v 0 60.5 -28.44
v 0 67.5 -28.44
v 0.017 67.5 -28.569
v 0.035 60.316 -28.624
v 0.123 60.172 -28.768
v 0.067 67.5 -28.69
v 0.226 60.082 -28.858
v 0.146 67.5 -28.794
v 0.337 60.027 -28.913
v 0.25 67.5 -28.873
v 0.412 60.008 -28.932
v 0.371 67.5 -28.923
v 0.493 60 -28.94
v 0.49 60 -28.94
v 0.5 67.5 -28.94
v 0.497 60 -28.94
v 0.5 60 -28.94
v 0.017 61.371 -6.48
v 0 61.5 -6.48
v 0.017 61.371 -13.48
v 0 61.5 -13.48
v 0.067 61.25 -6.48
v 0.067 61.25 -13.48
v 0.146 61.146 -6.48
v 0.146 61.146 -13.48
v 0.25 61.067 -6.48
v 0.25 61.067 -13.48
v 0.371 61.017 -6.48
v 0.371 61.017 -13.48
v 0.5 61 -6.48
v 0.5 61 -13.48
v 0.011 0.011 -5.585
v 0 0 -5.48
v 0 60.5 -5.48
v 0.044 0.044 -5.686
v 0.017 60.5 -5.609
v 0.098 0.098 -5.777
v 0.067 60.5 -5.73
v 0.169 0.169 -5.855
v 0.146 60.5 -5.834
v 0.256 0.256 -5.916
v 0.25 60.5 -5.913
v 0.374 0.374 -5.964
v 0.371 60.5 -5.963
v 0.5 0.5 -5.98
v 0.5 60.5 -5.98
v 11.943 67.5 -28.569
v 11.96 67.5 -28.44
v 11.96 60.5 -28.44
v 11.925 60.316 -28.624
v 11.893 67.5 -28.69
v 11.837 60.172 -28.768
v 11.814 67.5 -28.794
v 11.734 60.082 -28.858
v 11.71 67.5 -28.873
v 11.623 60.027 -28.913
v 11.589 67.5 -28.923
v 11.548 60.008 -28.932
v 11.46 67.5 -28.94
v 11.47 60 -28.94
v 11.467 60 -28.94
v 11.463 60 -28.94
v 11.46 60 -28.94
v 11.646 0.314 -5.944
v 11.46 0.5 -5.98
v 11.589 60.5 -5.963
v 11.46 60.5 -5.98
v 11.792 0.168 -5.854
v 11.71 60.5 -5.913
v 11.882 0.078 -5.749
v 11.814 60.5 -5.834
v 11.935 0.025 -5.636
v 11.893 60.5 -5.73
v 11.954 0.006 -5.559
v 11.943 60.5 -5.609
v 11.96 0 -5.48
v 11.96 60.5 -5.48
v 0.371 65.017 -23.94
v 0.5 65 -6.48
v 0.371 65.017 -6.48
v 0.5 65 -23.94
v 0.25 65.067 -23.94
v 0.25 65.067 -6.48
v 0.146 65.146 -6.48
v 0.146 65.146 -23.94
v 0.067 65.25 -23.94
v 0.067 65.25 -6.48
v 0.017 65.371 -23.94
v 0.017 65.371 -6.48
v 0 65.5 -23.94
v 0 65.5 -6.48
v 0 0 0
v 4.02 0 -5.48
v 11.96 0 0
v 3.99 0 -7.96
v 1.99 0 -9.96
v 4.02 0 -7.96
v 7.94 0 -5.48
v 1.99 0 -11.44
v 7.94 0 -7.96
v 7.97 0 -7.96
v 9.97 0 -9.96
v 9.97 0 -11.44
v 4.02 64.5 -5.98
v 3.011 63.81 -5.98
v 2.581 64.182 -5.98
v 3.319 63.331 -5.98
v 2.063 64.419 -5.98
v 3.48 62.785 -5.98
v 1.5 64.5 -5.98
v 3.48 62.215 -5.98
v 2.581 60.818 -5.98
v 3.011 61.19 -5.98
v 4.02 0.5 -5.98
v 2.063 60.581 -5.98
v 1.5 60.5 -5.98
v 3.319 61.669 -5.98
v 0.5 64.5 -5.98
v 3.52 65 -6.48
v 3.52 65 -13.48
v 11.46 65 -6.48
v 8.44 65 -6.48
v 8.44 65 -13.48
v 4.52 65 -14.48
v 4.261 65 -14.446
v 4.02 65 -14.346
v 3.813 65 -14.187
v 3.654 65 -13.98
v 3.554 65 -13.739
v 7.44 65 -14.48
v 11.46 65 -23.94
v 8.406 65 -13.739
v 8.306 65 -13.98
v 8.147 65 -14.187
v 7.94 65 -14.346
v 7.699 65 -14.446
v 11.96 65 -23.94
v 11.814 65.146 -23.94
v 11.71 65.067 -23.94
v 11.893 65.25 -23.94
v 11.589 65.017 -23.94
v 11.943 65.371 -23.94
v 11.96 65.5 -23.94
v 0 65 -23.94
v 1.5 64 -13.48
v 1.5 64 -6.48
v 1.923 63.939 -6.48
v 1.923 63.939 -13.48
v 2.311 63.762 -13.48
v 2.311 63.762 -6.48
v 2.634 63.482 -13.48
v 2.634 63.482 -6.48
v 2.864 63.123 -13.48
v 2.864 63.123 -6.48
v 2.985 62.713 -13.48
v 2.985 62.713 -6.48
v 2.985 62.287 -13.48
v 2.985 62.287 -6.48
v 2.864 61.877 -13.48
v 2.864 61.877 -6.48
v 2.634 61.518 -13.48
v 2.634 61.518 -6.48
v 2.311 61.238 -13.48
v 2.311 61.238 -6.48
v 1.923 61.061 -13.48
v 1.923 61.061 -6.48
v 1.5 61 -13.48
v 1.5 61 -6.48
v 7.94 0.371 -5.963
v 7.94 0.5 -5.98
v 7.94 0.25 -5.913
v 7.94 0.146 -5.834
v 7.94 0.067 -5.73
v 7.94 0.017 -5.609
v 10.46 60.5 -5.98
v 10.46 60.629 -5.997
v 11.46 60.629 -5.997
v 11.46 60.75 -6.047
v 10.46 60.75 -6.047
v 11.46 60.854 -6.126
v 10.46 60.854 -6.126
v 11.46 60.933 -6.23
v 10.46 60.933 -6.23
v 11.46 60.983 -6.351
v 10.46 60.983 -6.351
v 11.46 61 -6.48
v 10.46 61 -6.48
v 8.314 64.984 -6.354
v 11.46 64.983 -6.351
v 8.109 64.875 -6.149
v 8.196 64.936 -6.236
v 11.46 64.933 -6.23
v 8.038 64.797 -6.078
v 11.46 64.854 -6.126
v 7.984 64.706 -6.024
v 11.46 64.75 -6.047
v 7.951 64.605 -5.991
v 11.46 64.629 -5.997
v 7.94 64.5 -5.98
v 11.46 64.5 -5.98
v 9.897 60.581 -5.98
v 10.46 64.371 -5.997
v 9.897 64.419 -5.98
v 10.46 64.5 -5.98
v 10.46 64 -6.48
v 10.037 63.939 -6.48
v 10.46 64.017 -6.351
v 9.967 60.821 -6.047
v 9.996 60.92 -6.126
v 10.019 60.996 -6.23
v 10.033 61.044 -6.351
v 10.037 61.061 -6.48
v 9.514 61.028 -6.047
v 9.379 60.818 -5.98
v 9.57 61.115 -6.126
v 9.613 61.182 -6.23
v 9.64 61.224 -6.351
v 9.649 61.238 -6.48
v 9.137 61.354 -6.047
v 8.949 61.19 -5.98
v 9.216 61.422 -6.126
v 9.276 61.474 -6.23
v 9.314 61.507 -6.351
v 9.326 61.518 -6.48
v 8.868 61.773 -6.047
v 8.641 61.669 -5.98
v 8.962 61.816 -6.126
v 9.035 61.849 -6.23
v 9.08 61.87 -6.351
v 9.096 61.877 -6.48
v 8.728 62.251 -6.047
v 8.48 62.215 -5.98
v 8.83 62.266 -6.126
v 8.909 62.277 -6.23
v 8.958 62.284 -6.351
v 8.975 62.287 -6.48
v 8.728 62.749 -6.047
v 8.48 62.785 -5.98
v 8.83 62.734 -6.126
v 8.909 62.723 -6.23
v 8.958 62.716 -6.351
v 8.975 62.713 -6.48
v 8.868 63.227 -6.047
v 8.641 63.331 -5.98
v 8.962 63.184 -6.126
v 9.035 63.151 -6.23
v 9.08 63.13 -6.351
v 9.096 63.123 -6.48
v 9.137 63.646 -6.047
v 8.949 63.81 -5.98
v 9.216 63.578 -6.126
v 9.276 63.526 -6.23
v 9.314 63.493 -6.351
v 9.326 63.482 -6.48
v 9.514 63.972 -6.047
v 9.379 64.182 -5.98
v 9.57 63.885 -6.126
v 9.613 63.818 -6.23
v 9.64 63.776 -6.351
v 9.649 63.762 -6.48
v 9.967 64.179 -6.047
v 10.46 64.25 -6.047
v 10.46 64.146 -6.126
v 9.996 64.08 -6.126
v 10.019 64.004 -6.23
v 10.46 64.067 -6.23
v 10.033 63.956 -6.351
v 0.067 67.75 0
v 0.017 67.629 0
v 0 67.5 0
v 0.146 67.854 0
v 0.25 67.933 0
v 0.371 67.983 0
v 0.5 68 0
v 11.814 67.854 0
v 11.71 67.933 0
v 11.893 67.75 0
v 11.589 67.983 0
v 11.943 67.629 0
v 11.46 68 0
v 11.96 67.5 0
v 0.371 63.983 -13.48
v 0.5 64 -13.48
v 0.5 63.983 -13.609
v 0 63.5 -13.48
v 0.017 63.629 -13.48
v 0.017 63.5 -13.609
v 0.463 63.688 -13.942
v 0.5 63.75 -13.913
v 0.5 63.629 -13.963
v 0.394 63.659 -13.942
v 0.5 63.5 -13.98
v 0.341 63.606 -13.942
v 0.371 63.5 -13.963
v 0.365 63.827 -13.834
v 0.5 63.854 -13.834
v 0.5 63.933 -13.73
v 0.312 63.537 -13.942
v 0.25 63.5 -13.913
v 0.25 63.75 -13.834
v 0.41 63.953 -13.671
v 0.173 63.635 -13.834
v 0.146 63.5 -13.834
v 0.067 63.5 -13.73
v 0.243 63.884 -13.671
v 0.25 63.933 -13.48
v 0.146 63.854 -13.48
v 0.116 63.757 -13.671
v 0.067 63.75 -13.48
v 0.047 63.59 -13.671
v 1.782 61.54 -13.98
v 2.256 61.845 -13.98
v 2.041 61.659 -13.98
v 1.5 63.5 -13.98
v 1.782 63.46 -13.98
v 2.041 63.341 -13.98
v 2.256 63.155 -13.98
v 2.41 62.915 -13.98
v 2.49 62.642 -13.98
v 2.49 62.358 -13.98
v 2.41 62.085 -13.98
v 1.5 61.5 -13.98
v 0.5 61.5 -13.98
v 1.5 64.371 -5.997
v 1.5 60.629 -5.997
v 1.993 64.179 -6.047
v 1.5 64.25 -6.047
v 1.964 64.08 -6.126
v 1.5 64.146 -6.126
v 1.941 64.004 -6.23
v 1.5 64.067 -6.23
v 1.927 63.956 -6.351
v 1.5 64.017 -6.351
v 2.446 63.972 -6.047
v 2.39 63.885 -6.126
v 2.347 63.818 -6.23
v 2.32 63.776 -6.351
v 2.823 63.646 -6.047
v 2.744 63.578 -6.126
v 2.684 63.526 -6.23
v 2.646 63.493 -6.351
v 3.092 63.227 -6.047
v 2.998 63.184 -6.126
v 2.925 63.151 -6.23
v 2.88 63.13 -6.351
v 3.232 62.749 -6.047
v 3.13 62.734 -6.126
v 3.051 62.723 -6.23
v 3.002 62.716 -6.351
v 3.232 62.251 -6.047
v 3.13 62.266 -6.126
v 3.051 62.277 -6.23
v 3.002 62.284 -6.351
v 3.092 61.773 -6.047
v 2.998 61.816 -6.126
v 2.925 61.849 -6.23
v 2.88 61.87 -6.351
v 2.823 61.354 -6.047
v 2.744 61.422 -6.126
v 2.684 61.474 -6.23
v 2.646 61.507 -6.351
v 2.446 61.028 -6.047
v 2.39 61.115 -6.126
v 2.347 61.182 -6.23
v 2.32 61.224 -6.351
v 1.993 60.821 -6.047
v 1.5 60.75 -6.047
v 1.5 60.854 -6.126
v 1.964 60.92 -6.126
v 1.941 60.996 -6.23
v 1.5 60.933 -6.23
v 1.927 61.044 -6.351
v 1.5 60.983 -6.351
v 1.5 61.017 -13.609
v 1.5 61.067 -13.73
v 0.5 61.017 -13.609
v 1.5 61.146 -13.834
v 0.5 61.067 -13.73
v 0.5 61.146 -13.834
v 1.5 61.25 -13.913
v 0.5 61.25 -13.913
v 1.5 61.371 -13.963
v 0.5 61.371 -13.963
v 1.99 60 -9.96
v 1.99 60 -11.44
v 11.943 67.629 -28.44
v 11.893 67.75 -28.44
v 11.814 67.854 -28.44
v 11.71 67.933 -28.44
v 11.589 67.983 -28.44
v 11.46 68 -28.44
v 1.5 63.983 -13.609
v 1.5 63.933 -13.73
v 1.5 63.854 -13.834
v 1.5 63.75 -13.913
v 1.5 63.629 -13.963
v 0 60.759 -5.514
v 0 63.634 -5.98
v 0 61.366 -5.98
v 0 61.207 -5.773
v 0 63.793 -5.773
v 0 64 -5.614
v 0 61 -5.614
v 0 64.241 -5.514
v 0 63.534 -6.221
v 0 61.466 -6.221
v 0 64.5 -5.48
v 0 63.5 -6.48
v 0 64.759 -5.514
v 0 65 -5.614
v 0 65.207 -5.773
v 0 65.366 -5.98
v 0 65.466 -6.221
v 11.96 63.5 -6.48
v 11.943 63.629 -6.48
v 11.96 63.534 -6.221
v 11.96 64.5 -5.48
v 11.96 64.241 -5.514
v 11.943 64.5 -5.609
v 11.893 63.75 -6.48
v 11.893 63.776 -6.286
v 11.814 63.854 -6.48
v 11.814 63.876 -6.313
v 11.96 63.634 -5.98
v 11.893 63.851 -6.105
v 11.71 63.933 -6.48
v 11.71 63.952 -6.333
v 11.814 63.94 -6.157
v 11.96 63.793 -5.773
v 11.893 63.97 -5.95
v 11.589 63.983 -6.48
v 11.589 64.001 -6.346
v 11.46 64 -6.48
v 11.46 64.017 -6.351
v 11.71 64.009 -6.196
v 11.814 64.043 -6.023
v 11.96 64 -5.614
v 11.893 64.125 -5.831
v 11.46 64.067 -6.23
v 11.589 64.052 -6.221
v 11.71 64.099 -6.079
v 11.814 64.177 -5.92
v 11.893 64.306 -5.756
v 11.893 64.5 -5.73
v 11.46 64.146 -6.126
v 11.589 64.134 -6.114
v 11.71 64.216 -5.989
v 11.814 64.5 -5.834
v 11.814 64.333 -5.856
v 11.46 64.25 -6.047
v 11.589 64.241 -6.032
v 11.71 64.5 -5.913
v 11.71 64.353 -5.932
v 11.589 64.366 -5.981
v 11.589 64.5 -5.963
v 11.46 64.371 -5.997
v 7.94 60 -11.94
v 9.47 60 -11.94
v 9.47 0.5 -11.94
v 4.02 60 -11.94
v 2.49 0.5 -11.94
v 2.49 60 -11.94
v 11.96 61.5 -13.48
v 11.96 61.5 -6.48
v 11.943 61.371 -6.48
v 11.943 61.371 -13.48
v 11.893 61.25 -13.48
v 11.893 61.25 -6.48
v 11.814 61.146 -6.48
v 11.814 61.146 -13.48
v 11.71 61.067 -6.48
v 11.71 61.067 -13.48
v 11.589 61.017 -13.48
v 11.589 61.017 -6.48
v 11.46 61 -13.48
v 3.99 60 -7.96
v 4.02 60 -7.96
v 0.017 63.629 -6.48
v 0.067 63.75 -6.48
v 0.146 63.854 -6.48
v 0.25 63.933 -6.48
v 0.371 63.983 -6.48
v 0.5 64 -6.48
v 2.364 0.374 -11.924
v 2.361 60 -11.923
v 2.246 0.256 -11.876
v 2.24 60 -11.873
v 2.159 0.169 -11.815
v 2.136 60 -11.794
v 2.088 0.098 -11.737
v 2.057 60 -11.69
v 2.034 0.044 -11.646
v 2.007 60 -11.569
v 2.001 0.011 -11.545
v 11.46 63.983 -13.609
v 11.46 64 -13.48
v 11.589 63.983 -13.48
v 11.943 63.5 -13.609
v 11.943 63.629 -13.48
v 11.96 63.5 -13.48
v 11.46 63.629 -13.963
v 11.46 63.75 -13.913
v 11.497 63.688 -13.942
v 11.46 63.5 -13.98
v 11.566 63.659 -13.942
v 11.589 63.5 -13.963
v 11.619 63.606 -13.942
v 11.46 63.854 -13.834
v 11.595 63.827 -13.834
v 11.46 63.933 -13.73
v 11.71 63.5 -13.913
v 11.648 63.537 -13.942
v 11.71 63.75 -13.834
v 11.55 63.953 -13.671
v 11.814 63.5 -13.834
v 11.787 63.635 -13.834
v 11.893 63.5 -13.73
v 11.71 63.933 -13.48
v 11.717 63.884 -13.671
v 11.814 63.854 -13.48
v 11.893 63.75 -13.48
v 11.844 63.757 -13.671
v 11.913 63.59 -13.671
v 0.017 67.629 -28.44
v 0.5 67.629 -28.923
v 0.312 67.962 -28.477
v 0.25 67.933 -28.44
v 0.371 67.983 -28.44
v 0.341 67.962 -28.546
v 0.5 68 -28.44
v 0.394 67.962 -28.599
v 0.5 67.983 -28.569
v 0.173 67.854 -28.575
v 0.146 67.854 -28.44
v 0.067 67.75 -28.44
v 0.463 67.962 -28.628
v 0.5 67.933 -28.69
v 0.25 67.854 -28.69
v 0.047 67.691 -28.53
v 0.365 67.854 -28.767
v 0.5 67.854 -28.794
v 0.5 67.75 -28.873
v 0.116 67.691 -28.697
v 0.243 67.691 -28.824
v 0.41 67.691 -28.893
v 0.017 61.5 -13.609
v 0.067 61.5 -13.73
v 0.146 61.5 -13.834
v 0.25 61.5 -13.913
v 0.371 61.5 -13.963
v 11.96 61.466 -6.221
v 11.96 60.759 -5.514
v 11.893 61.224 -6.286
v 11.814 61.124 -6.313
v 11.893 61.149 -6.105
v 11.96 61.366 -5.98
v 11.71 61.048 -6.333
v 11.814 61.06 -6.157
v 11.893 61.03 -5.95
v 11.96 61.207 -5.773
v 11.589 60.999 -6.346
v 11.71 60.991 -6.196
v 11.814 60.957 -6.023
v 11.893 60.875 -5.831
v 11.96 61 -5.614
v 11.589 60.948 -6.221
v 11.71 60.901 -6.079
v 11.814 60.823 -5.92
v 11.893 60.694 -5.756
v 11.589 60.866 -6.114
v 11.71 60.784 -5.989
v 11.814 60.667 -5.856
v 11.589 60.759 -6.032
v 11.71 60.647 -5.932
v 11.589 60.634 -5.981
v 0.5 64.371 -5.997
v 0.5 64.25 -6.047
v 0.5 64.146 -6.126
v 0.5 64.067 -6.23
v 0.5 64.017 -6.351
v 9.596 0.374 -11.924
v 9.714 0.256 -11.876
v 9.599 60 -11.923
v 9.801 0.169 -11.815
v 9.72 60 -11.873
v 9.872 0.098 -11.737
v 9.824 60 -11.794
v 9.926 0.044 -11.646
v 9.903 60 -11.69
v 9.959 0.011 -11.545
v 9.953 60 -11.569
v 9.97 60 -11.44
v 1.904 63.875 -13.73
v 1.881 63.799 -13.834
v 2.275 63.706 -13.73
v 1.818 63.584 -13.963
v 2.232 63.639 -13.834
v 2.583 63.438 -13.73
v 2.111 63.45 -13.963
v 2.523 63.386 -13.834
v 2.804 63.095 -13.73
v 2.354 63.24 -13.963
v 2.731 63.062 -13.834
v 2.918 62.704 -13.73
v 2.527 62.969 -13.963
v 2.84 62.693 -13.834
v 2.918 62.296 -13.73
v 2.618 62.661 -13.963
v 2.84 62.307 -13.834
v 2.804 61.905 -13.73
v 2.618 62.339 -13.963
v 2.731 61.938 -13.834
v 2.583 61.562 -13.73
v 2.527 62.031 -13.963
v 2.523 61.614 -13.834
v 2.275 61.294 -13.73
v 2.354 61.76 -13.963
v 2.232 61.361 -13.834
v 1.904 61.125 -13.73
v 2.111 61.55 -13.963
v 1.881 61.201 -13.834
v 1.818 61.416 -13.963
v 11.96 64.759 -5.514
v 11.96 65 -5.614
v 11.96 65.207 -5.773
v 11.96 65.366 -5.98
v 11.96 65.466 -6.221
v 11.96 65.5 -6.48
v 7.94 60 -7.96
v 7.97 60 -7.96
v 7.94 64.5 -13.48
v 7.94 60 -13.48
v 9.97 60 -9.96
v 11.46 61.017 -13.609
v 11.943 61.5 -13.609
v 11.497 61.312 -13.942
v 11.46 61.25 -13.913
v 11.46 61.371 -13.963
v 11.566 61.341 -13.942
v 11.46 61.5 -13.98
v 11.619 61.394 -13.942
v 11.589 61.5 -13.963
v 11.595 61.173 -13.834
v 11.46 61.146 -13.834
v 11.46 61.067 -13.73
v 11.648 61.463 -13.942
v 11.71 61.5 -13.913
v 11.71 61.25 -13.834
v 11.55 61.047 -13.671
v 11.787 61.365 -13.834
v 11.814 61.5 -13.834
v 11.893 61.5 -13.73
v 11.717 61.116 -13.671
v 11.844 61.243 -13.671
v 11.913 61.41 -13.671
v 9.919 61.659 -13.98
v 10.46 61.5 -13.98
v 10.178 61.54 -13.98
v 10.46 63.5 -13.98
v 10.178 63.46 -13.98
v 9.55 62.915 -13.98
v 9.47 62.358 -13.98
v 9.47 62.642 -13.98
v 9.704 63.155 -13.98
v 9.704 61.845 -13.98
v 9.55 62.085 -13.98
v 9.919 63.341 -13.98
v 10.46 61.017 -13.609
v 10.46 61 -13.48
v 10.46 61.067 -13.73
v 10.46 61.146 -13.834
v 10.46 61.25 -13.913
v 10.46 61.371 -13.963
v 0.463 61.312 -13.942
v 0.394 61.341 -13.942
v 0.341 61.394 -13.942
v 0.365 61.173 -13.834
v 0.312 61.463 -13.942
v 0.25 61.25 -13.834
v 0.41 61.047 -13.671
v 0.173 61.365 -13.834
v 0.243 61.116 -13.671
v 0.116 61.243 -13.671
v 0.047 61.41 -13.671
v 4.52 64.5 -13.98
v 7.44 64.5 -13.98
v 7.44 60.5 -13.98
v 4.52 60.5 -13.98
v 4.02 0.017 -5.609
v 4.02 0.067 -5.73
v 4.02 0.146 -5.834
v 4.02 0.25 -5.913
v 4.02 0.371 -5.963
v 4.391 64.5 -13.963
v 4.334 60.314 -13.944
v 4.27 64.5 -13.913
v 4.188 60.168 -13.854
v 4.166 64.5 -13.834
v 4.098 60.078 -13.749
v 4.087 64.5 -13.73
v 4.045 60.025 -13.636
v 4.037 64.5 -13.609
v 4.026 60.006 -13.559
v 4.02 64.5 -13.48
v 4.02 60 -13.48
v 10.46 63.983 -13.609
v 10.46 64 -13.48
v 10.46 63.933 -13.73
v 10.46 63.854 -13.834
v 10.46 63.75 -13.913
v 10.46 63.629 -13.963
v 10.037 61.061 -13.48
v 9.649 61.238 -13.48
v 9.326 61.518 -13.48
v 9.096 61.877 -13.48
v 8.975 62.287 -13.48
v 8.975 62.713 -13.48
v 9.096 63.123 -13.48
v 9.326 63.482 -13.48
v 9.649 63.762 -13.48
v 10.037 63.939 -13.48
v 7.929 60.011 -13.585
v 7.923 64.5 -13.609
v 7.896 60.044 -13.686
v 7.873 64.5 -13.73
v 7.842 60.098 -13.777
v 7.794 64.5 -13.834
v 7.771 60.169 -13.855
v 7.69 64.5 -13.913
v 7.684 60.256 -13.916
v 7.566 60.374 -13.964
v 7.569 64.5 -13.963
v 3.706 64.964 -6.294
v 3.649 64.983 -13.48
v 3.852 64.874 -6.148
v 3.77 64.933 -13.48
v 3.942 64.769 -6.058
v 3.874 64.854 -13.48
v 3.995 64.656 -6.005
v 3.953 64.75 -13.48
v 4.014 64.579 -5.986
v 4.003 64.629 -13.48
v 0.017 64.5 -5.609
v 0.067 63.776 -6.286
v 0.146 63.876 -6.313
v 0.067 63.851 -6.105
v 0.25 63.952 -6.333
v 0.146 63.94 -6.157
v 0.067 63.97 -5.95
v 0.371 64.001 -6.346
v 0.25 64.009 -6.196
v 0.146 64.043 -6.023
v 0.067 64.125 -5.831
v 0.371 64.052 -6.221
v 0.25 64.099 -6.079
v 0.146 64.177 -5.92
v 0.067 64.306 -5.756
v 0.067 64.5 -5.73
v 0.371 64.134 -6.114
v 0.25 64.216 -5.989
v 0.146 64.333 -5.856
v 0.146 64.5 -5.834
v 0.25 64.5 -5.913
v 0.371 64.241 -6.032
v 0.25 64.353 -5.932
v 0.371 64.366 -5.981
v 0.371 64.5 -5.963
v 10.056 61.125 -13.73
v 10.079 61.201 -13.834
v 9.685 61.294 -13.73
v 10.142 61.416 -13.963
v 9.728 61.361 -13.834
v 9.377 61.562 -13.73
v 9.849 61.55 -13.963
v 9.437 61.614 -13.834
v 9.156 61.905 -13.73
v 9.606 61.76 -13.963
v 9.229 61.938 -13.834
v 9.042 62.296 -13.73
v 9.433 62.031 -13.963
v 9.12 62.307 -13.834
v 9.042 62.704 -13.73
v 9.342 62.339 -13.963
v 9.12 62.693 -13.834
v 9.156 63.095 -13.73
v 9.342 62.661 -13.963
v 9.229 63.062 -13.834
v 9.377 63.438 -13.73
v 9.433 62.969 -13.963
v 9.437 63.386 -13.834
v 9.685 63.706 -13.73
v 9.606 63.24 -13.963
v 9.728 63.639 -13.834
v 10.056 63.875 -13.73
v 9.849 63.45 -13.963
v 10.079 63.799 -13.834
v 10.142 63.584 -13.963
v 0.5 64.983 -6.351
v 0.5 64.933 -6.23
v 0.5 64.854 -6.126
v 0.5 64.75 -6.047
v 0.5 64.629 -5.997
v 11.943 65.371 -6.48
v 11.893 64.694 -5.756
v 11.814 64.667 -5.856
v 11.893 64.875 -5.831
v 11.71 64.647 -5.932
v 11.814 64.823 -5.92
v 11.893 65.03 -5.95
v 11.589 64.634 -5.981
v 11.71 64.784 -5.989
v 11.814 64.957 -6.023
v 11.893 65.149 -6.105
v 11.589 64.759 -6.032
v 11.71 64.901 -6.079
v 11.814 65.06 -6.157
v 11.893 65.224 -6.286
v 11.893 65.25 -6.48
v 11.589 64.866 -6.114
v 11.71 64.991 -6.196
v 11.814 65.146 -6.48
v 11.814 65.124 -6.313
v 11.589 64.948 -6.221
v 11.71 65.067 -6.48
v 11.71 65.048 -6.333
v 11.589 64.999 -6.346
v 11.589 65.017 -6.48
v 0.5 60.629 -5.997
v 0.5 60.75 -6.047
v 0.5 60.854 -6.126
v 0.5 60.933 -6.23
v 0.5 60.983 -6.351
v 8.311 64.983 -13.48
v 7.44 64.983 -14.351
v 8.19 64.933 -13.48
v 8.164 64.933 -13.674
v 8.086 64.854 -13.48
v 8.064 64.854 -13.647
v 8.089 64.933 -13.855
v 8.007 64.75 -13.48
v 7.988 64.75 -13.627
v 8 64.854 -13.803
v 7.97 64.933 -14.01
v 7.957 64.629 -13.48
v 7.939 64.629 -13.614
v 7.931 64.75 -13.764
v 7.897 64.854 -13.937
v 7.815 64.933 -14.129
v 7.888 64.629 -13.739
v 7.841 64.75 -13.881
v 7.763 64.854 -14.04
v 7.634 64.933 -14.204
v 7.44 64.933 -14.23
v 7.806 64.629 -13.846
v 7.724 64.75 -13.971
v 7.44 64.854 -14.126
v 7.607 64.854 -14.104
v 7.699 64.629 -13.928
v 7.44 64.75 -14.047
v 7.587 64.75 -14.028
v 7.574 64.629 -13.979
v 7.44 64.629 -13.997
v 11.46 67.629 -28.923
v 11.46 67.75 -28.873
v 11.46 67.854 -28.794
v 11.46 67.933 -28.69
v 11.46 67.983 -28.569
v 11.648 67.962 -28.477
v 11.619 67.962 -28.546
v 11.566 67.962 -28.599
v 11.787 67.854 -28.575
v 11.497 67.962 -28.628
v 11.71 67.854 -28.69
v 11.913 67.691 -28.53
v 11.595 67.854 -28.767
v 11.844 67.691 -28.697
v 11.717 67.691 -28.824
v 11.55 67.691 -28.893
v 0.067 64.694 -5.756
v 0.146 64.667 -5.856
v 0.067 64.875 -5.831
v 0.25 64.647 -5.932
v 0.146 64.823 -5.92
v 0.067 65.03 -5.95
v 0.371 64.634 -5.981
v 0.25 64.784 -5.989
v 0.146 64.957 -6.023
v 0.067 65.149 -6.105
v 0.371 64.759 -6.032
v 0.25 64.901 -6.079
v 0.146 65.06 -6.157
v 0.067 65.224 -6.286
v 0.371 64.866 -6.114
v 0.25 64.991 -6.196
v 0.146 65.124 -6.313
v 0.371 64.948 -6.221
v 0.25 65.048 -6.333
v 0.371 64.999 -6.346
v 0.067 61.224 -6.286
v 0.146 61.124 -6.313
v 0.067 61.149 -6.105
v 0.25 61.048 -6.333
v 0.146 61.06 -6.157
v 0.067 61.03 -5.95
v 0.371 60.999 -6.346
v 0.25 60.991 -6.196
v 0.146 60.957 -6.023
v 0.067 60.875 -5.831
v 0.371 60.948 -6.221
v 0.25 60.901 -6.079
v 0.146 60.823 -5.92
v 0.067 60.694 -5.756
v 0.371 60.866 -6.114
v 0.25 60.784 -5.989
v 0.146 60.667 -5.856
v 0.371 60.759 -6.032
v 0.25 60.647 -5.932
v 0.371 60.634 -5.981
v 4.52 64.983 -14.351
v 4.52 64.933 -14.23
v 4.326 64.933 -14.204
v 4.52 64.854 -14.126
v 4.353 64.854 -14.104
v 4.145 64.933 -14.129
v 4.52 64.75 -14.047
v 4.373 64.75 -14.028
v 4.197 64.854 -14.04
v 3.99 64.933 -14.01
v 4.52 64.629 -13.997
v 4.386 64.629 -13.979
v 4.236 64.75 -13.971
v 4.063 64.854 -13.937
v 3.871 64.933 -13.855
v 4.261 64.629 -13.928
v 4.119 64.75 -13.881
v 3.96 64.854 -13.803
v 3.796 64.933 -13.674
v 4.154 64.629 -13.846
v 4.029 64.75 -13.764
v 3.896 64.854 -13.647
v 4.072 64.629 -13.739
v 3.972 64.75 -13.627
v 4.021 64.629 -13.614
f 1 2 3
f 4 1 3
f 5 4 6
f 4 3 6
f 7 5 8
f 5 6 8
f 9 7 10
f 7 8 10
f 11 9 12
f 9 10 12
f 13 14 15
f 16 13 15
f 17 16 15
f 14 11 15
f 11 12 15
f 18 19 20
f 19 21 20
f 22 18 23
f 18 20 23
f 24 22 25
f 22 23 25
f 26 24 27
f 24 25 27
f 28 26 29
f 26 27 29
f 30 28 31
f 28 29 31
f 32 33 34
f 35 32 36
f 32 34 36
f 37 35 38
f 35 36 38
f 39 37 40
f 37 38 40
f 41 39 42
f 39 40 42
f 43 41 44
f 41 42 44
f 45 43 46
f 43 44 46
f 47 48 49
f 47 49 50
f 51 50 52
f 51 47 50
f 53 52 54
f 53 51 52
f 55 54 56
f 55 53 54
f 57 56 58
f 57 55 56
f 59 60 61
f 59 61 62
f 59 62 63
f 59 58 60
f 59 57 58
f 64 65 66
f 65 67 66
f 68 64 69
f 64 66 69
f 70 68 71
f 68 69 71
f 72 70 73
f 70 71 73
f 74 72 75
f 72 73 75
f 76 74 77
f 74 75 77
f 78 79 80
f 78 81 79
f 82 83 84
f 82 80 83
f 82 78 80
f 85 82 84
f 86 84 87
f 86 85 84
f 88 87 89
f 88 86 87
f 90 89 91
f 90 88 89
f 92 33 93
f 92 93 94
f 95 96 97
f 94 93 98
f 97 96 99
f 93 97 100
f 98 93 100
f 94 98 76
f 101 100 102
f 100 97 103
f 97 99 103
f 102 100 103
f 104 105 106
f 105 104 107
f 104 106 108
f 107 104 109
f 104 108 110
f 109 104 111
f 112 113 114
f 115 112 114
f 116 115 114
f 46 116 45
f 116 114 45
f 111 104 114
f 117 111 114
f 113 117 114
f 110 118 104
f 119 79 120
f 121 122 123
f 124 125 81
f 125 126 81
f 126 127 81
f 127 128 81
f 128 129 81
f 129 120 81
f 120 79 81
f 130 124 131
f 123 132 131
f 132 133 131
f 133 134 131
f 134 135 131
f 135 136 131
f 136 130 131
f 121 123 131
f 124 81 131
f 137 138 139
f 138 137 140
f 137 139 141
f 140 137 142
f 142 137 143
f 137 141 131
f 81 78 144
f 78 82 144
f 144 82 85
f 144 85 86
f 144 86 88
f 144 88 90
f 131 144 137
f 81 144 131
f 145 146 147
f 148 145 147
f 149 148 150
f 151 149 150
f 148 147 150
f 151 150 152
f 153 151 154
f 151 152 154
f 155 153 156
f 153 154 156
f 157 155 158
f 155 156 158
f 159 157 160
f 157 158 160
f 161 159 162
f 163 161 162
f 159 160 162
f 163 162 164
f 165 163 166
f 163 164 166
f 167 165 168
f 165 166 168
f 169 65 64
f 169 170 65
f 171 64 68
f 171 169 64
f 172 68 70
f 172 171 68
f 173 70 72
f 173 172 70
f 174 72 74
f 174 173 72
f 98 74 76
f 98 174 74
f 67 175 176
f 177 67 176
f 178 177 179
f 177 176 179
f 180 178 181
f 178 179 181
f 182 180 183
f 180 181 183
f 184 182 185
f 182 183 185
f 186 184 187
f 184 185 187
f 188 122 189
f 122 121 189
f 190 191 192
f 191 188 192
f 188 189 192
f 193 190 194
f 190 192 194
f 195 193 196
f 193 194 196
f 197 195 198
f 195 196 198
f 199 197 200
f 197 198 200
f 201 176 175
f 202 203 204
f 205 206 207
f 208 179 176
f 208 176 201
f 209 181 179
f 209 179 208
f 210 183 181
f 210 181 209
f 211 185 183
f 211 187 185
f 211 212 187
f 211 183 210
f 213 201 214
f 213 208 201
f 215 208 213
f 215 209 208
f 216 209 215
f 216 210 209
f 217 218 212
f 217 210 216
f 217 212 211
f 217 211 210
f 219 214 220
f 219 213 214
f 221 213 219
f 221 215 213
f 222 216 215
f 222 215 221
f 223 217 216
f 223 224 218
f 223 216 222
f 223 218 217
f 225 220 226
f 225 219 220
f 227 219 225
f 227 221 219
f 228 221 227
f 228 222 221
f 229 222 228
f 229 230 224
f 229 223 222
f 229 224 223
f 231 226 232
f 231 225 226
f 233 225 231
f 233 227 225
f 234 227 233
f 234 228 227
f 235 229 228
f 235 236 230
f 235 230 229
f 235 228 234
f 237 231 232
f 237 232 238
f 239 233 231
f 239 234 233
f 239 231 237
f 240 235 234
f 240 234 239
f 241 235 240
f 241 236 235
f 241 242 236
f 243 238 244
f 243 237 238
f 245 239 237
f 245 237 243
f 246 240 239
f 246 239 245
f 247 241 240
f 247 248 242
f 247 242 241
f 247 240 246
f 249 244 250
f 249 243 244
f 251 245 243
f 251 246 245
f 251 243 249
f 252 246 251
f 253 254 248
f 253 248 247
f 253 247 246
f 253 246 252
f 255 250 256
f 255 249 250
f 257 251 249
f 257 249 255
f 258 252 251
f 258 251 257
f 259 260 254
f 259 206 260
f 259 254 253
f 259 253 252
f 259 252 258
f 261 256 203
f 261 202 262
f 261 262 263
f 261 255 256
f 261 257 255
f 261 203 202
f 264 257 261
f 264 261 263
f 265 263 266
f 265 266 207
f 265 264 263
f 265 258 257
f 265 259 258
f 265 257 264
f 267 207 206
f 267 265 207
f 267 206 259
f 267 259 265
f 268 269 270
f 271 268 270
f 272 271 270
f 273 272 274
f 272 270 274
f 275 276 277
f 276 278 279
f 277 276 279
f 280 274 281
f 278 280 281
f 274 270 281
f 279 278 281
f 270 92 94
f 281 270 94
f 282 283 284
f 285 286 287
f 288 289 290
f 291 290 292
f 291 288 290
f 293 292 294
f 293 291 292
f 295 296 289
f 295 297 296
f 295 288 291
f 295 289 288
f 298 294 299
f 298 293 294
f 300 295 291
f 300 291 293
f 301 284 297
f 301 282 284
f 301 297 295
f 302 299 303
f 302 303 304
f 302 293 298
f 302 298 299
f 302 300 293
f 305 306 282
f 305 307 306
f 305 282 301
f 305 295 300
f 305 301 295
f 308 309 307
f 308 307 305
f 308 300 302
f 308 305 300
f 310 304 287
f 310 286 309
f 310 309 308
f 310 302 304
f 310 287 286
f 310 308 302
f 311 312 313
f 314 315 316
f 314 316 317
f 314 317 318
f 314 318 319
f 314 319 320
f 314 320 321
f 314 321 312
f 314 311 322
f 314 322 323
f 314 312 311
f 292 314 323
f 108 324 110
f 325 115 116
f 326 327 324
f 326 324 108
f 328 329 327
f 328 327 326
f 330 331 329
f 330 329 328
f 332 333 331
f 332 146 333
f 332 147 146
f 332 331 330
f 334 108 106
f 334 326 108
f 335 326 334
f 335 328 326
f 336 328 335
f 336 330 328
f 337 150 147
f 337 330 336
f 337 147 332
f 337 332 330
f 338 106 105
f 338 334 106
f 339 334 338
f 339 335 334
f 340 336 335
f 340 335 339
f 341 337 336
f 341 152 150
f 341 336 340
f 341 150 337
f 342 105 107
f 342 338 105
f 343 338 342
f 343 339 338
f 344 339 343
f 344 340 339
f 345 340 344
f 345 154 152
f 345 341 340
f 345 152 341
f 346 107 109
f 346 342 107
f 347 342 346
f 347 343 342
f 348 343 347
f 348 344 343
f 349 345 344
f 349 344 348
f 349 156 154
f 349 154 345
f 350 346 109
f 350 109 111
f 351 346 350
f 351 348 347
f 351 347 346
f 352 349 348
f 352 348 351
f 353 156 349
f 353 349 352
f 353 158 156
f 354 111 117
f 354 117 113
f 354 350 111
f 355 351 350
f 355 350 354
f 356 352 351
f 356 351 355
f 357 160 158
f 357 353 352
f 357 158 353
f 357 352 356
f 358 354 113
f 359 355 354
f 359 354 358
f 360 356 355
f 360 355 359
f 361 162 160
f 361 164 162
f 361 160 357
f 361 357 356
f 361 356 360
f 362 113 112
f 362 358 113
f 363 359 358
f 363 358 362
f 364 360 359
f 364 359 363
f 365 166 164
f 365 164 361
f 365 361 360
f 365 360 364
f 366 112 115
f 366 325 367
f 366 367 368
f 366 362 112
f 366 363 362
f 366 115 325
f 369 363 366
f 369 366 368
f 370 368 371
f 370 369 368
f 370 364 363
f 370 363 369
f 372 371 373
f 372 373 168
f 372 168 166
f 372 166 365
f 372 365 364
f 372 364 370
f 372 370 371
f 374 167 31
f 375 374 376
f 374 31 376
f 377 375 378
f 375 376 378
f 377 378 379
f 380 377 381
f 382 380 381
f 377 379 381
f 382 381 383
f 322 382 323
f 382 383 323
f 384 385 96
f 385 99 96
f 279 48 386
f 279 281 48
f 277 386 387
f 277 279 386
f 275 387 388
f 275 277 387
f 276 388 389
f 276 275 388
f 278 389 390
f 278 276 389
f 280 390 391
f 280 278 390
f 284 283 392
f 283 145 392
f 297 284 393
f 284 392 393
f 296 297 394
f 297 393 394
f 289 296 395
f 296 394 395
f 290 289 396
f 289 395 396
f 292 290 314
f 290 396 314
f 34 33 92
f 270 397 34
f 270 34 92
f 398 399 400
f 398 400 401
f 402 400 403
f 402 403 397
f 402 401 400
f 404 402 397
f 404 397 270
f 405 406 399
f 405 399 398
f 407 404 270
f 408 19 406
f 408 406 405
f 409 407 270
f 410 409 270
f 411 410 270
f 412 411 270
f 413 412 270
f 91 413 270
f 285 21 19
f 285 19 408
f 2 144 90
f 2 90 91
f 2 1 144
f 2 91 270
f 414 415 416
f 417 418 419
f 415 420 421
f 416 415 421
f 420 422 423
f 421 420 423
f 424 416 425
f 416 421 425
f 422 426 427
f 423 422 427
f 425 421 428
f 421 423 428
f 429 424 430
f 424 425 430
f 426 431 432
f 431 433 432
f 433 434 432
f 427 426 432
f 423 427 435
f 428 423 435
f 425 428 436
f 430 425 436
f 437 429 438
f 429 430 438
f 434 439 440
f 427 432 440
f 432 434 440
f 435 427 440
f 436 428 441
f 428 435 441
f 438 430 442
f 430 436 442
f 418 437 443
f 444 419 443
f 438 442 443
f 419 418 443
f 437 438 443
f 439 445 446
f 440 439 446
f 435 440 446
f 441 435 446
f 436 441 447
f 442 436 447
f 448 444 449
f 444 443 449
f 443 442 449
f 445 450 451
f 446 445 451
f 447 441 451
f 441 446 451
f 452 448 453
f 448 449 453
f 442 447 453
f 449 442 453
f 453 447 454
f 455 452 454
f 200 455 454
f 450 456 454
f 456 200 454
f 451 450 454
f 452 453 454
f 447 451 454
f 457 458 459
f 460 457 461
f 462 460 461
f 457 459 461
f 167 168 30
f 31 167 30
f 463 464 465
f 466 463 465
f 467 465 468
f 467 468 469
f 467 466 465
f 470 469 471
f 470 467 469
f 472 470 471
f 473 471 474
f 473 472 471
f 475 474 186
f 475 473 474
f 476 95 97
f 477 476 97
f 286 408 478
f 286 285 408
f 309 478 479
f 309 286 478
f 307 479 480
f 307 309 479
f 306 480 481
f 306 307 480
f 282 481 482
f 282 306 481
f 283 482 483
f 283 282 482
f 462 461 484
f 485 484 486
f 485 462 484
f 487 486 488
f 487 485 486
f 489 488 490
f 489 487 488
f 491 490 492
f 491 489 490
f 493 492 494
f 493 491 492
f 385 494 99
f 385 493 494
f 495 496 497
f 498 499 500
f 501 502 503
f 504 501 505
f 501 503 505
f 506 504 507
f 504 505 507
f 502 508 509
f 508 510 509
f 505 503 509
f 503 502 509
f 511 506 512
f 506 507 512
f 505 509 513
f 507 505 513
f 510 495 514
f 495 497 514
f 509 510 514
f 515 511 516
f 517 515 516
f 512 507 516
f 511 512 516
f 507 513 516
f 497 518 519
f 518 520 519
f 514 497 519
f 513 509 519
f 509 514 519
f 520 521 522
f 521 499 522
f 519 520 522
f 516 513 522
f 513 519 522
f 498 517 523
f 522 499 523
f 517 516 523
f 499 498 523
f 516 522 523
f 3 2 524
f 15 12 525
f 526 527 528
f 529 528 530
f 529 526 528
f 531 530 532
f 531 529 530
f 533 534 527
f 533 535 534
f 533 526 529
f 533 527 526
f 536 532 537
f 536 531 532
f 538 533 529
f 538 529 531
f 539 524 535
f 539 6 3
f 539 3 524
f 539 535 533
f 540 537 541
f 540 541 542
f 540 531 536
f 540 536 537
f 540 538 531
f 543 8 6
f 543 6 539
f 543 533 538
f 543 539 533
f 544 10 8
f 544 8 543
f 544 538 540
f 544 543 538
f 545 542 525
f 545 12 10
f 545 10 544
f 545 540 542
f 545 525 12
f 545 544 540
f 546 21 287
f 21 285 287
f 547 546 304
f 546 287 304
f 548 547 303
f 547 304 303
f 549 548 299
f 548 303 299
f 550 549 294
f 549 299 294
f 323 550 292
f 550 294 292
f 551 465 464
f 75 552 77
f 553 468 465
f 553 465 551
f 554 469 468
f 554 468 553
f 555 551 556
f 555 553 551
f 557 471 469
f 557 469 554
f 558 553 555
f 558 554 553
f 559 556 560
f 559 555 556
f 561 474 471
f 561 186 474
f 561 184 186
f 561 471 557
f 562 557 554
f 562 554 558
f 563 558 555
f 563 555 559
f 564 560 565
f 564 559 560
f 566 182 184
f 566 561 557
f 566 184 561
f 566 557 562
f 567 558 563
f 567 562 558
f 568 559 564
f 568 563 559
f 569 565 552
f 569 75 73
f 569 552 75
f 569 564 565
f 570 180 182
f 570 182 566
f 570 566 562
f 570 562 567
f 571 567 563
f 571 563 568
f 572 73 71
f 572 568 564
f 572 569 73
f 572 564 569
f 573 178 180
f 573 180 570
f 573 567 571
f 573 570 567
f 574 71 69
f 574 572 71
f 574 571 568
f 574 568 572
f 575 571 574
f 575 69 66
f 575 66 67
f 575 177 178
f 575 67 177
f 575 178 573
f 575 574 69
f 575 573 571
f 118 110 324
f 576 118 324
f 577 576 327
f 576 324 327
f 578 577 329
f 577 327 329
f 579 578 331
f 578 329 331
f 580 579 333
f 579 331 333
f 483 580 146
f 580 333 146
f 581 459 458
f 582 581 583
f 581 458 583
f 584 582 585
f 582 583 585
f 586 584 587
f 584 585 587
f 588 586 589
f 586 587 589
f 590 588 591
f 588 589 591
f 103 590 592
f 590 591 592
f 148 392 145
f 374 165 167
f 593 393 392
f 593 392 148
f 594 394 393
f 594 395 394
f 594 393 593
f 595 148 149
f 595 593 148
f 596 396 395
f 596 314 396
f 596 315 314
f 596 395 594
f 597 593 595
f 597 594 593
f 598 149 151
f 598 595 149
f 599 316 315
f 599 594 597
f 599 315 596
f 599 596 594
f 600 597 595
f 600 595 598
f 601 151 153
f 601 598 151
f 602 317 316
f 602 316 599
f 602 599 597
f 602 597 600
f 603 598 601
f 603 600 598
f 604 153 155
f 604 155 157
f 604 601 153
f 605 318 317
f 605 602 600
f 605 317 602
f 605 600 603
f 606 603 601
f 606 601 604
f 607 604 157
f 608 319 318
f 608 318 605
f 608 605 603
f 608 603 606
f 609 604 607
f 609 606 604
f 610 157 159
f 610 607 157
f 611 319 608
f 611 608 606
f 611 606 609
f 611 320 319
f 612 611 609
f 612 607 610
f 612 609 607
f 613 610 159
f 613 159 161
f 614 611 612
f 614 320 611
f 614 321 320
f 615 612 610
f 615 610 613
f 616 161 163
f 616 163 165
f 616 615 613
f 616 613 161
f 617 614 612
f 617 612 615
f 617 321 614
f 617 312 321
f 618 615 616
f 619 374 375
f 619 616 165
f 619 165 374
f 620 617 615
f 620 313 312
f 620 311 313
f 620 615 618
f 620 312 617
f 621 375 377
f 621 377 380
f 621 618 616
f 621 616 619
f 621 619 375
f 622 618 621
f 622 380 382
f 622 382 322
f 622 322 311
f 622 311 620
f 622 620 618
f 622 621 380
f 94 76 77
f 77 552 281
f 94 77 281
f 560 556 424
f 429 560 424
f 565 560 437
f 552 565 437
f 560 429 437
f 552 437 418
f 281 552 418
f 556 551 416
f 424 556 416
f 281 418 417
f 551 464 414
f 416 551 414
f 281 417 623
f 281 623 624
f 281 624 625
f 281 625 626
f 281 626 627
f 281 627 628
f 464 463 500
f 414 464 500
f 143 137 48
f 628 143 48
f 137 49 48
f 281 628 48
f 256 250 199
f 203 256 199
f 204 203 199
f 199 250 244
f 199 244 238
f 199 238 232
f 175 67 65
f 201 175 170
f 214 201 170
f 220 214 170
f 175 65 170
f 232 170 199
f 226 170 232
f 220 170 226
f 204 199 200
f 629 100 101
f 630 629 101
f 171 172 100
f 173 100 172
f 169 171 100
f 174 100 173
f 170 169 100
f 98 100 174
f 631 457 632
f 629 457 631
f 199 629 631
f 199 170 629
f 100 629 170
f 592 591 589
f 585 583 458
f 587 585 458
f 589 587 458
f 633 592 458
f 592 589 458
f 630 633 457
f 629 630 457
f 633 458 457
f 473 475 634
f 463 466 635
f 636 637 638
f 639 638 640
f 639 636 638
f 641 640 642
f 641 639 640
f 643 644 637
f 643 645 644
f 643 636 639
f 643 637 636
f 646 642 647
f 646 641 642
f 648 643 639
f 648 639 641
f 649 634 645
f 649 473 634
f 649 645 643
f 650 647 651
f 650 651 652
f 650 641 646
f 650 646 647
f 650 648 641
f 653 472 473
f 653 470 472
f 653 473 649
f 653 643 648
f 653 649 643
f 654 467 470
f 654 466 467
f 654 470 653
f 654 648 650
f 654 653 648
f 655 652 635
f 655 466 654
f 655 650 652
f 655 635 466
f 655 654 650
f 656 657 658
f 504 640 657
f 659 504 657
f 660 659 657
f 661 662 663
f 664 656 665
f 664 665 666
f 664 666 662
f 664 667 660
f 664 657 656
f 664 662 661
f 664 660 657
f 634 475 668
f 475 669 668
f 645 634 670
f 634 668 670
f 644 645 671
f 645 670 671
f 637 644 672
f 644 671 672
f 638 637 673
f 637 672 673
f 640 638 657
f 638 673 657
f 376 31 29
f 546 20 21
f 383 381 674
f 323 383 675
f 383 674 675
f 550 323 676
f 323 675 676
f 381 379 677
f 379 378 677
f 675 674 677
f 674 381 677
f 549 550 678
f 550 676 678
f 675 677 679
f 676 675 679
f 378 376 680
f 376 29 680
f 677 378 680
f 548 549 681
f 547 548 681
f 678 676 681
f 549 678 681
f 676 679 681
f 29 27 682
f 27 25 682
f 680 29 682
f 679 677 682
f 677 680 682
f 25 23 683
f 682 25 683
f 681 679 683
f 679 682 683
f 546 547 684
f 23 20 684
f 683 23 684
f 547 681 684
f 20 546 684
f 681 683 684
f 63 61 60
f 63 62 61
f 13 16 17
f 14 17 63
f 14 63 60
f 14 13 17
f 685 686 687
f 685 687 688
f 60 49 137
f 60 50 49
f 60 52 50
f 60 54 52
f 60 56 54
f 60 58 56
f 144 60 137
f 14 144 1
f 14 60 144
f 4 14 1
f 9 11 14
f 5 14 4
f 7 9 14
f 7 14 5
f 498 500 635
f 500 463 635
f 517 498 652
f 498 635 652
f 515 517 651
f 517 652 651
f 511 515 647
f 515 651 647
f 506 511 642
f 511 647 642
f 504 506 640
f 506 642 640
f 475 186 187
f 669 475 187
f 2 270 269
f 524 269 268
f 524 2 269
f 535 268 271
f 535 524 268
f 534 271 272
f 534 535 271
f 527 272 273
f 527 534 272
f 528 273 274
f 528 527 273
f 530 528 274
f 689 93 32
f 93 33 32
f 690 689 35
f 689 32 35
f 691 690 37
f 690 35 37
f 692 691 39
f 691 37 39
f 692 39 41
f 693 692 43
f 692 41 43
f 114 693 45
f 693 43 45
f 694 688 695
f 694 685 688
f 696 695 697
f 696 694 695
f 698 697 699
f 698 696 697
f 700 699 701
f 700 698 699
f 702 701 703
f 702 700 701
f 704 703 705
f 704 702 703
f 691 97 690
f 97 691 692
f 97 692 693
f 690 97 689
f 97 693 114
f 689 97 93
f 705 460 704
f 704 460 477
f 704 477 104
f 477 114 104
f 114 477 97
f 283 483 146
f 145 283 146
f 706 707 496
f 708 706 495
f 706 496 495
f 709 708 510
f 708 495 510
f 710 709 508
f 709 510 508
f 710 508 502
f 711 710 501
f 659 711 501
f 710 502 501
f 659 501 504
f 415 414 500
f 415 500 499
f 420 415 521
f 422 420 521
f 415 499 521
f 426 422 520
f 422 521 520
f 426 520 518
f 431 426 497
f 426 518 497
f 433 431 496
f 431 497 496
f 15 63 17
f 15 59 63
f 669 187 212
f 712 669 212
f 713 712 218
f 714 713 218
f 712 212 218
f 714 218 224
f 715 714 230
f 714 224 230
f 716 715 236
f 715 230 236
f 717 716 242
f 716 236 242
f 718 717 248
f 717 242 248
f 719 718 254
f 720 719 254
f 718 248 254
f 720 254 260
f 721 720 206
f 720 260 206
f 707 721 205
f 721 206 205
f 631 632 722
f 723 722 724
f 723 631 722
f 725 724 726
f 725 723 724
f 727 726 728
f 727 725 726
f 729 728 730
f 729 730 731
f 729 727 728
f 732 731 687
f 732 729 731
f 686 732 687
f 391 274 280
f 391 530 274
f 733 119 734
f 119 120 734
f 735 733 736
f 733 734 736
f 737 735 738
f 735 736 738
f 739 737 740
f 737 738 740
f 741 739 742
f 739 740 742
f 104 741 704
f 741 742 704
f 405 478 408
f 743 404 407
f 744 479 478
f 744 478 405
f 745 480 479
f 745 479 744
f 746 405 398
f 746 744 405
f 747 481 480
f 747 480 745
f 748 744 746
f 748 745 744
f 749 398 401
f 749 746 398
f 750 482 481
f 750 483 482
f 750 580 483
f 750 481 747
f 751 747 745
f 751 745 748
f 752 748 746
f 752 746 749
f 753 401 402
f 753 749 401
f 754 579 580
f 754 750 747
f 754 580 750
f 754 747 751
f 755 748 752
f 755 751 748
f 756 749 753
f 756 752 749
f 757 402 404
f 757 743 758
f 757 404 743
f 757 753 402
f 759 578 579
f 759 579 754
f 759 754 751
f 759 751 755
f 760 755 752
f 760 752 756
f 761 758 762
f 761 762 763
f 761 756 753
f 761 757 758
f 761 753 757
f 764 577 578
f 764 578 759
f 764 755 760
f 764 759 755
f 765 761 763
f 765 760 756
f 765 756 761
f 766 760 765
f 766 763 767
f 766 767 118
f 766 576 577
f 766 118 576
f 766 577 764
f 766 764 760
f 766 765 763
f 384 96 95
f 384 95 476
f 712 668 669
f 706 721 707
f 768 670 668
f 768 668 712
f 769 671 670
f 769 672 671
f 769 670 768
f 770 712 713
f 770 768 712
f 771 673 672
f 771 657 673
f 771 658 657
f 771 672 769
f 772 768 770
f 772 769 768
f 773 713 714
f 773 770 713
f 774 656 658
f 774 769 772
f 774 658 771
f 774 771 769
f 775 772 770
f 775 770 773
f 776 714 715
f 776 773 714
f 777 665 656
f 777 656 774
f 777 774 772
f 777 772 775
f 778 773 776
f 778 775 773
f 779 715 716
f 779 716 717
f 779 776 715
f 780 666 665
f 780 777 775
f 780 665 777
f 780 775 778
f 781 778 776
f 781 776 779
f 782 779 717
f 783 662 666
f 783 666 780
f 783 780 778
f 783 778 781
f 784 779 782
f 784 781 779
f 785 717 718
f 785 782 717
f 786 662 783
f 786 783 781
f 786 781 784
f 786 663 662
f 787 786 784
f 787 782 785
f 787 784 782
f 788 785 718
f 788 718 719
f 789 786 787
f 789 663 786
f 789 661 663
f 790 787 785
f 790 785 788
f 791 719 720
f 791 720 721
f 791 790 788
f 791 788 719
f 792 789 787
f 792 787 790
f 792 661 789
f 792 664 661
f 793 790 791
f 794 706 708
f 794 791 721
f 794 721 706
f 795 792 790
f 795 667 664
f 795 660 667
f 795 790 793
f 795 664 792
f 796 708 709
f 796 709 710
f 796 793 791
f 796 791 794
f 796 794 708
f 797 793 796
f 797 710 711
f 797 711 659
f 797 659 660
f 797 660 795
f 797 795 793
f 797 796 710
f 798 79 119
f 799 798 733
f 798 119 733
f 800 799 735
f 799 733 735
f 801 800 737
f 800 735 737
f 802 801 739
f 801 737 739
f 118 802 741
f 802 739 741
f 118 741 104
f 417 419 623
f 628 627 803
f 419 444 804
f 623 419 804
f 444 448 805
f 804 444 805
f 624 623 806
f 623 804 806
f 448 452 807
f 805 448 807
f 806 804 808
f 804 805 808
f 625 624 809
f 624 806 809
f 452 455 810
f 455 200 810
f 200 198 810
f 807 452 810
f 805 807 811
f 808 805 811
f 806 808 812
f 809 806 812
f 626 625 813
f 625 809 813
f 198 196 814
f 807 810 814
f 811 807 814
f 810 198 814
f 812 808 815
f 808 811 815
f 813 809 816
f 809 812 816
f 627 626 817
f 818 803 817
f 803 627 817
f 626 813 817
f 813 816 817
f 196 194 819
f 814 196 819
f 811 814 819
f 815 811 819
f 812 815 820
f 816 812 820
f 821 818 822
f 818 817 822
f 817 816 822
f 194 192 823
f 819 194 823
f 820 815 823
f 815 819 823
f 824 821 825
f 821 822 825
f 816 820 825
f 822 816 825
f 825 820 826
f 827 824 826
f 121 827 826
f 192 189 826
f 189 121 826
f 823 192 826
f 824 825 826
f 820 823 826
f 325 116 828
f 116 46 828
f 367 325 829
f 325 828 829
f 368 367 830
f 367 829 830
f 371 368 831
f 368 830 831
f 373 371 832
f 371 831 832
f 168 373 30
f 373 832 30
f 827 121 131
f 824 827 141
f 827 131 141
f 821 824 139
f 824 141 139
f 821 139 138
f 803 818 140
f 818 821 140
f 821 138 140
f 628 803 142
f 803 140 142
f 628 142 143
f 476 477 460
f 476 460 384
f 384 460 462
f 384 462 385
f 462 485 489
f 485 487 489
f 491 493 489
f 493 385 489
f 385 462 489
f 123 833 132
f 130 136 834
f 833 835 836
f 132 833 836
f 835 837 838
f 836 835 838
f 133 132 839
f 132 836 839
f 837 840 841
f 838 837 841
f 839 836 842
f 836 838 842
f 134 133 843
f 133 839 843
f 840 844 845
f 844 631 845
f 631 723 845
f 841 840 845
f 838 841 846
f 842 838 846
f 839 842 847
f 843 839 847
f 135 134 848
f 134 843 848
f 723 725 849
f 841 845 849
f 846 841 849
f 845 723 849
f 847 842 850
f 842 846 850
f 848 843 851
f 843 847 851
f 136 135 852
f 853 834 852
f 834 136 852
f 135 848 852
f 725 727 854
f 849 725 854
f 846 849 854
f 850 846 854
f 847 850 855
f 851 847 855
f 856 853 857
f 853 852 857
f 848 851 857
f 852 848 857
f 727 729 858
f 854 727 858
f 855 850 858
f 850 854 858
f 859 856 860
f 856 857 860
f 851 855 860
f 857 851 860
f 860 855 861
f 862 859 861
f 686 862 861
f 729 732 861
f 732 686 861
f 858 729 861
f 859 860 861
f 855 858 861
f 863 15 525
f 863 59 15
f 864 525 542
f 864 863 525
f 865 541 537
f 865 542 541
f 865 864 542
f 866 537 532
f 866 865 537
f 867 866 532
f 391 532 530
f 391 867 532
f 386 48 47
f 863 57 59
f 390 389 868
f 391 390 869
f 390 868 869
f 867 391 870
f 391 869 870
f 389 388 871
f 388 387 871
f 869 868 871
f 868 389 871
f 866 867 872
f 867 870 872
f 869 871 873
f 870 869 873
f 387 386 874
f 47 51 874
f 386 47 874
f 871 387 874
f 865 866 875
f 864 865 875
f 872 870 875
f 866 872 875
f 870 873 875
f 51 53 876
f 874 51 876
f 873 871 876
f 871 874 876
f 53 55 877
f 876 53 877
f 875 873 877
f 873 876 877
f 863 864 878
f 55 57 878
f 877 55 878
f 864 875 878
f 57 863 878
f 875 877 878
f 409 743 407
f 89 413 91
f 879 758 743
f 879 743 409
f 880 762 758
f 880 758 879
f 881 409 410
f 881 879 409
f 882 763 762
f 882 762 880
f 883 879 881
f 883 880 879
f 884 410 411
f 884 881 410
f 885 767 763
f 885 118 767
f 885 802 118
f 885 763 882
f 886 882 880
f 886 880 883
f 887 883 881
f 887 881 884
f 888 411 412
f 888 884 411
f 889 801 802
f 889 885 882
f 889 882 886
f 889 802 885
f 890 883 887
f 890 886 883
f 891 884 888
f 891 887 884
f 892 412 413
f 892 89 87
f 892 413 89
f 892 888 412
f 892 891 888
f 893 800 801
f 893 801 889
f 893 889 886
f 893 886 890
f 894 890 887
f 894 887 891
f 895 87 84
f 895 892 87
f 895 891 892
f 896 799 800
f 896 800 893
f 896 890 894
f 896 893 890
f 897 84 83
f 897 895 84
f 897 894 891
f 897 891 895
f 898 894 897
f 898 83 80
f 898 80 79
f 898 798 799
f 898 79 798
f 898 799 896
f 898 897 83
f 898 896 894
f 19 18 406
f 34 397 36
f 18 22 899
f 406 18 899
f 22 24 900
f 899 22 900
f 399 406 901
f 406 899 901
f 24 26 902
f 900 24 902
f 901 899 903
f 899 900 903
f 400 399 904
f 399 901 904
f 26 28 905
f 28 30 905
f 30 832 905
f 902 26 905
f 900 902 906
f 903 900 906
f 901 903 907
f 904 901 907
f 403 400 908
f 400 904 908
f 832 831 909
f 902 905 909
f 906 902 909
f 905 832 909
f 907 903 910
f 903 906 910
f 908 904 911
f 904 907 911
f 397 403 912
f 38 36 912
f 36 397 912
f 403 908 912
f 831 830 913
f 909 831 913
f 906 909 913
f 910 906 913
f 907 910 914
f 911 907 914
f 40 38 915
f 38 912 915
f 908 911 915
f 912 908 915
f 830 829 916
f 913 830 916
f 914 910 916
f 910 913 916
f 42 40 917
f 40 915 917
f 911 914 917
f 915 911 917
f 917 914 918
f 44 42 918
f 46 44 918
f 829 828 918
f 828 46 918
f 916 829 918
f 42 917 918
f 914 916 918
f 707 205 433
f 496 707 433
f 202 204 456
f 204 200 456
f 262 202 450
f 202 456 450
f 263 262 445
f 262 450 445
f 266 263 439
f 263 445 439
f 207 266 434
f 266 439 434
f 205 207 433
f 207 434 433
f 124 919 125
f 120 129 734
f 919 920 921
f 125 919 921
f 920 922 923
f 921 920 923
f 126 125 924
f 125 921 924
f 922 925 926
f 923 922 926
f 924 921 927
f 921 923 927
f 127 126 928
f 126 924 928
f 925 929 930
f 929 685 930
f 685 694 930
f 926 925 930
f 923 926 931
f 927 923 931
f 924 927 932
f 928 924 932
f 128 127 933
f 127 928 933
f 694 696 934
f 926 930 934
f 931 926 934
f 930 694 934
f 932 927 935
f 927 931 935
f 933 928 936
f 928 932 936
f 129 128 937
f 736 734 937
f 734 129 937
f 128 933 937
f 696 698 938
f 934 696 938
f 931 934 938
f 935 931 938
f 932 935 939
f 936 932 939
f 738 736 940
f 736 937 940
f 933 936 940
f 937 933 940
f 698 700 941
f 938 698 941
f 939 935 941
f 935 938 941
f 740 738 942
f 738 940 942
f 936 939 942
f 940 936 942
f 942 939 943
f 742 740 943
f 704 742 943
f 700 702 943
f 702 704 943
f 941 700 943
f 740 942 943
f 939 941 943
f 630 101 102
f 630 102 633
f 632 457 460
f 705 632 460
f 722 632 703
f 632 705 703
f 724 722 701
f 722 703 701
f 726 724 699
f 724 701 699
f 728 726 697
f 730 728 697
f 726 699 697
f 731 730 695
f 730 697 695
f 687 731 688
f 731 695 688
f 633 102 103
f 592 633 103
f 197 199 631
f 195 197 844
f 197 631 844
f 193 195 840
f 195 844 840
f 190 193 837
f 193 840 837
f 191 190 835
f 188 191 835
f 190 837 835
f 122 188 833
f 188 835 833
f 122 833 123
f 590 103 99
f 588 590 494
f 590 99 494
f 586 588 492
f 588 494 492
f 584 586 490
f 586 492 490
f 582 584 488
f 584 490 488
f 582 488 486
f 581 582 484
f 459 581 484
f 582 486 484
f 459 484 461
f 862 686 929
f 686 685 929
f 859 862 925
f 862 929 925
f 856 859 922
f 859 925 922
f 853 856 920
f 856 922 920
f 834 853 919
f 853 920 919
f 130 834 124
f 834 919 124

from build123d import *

# Parameters (mm, degrees)
BOSS_EXTRU_1_DEPTH      = 65
ESQUISSE2_W             = 11.96
ESQUISSE2_H             = 28.94
BOSS_EXTRU_2_DEPTH      = 3
ESQUISSE3_W             = 11.96
ESQUISSE3_H             = 8
BOSS_EXTRU_3_DEPTH      = 5
CHANFREIN4_SIZE         = 2
ESQUISSE8_W             = 7.98
ESQUISSE8_H             = 5
ENL_V_MAT_EXTRU_1_DEPTH = 5.96
ESQUISSE9_W             = 3.92
ESQUISSE9_H             = 5
BOSS_EXTRU_5_DEPTH      = 8
BOSS_EXTRU_4_DEPTH      = 8
CONG_2_R                = 0.5
CHANFREIN5_SIZE         = 5


with BuildPart() as part:
    # Esquisse1 → Boss.-Extru.1 (new body)
    with BuildSketch(Plane(origin=(0, 0, 0), x_dir=(1, 0, 0), z_dir=(0, 1, 0))):
        Polygon((7.94, 7.96), (9.97, 7.96), (9.97, 11.94), (1.99, 11.94), (1.99, 7.96), (4.02, 7.96), (4.02, 5.98), (0, 5.98), (0, 0), (11.96, 0), (11.96, 5.98), (7.94, 5.98), align=None)
    extrude(amount=BOSS_EXTRU_1_DEPTH)

    # Esquisse2 → Boss.-Extru.2 (add)
    with BuildSketch(Plane(origin=(0, 65, 0), x_dir=(1, 0, 0), z_dir=(0, 1, 0))):
        with Locations((5.98, 14.47)):
            Rectangle(ESQUISSE2_W, ESQUISSE2_H)
    extrude(amount=BOSS_EXTRU_2_DEPTH)

    # Esquisse3 → Boss.-Extru.3 (add)
    with BuildSketch(Plane(origin=(0, 0, -28.94), x_dir=(-1, 0, 0), z_dir=(0, 0, -1))):
        with Locations((-5.98, 64)):
            Rectangle(ESQUISSE3_W, ESQUISSE3_H)
    extrude(amount=-BOSS_EXTRU_3_DEPTH)

    # Chanfrein4
    chanfrein4_edges = [part.edges().sort_by_distance(p)[0] for p in [
        (1.99, 32.5, -7.96),
        (9.97, 32.5, -7.96),
    ]]
    chamfer(chanfrein4_edges, length=CHANFREIN4_SIZE)

    # Esquisse8 → Enlèv. mat.-Extru.1 (cut)
    with BuildSketch(Plane(origin=(0, 0, -11.94), x_dir=(-1, 0, 0), z_dir=(0, 0, -1))):
        with Locations((-5.98, 62.5)):
            Rectangle(ESQUISSE8_W, ESQUISSE8_H)
    extrude(amount=-ENL_V_MAT_EXTRU_1_DEPTH, mode=Mode.SUBTRACT)

    # Esquisse9 → Boss.-Extru.5 (add)
    with BuildSketch(Plane(origin=(0, 0, -5.98), x_dir=(-1, 0, 0), z_dir=(0, 0, -1))):
        with Locations((-5.98, 62.5)):
            Rectangle(ESQUISSE9_W, ESQUISSE9_H)
    extrude(amount=BOSS_EXTRU_5_DEPTH)

    # Esquisse5 → Boss.-Extru.4 (add)
    with BuildSketch(Plane(origin=(0, 0, -5.98), x_dir=(-1, 0, 0), z_dir=(0, 0, -1))):
        with BuildLine():
            Line((-10.46, 64), (-11.96, 64))
            Line((-11.96, 64), (-11.96, 61))
            Line((-11.96, 61), (-10.46, 61))
            ThreePointArc((-10.46, 61), (-8.96, 62.5), (-10.46, 64))
        make_face()
        with BuildLine():
            Line((-1.5, 61), (0, 61))
            Line((0, 61), (0, 64))
            Line((0, 64), (-1.5, 64))
            ThreePointArc((-1.5, 64), (-3, 62.5), (-1.5, 61))
        make_face()
    extrude(amount=BOSS_EXTRU_4_DEPTH)

    # Congé2
    cong_2_edges = [part.edges().sort_by_distance(p)[0] for p in [
        (2.01, 0, -5.98),
        (2.01, 65, -5.98),
        (4.02, 65, -9.98),
        (7.94, 65, -9.98),
        (4.02, 62.5, -13.98),
        (5.98, 65, -13.98),
        (7.94, 62.5, -13.98),
        (5.98, 60, -13.98),
        (5.98, 0, -11.94),
        (0, 30.5, -5.98),
        (3, 62.5, -5.98),
        (0.75, 61, -5.98),
        (0, 61, -9.98),
        (0.75, 64, -5.98),
        (0, 64, -9.98),
        (3, 62.5, -13.98),
        (0.75, 61, -13.98),
        (0, 62.5, -13.98),
        (0.75, 64, -13.98),
        (11.96, 30.5, -5.98),
        (8.96, 62.5, -5.98),
        (11.21, 64, -5.98),
        (9.95, 0, -5.98),
        (11.96, 64, -9.98),
        (11.21, 61, -5.98),
        (11.96, 61, -9.98),
        (8.96, 62.5, -13.98),
        (11.21, 64, -13.98),
        (11.96, 62.5, -13.98),
        (11.21, 61, -13.98),
        (9.95, 65, -5.98),
        (0, 64.5, -5.98),
        (11.96, 64.5, -5.98),
        (0, 64, -28.94),
        (11.96, 65, -14.96),
        (11.96, 64, -28.94),
        (0, 68, -14.47),
        (11.96, 68, -14.47),
        (5.98, 68, -28.94),
        (0, 65, -14.96),
        (1.99, 30, -11.94),
        (9.97, 30, -11.94),
    ]]
    fillet(cong_2_edges, radius=CONG_2_R - 0.0001)  # a hair under: the kernel refuses the full size

    # Chanfrein5
    chanfrein5_edges = [part.edges().sort_by_distance(p)[0] for p in [
        (5.98, 60, -23.94),
    ]]
    chamfer(chanfrein5_edges, length=CHANFREIN5_SIZE - 0.0001)  # a hair under: the kernel refuses the full size


solid = part.part
